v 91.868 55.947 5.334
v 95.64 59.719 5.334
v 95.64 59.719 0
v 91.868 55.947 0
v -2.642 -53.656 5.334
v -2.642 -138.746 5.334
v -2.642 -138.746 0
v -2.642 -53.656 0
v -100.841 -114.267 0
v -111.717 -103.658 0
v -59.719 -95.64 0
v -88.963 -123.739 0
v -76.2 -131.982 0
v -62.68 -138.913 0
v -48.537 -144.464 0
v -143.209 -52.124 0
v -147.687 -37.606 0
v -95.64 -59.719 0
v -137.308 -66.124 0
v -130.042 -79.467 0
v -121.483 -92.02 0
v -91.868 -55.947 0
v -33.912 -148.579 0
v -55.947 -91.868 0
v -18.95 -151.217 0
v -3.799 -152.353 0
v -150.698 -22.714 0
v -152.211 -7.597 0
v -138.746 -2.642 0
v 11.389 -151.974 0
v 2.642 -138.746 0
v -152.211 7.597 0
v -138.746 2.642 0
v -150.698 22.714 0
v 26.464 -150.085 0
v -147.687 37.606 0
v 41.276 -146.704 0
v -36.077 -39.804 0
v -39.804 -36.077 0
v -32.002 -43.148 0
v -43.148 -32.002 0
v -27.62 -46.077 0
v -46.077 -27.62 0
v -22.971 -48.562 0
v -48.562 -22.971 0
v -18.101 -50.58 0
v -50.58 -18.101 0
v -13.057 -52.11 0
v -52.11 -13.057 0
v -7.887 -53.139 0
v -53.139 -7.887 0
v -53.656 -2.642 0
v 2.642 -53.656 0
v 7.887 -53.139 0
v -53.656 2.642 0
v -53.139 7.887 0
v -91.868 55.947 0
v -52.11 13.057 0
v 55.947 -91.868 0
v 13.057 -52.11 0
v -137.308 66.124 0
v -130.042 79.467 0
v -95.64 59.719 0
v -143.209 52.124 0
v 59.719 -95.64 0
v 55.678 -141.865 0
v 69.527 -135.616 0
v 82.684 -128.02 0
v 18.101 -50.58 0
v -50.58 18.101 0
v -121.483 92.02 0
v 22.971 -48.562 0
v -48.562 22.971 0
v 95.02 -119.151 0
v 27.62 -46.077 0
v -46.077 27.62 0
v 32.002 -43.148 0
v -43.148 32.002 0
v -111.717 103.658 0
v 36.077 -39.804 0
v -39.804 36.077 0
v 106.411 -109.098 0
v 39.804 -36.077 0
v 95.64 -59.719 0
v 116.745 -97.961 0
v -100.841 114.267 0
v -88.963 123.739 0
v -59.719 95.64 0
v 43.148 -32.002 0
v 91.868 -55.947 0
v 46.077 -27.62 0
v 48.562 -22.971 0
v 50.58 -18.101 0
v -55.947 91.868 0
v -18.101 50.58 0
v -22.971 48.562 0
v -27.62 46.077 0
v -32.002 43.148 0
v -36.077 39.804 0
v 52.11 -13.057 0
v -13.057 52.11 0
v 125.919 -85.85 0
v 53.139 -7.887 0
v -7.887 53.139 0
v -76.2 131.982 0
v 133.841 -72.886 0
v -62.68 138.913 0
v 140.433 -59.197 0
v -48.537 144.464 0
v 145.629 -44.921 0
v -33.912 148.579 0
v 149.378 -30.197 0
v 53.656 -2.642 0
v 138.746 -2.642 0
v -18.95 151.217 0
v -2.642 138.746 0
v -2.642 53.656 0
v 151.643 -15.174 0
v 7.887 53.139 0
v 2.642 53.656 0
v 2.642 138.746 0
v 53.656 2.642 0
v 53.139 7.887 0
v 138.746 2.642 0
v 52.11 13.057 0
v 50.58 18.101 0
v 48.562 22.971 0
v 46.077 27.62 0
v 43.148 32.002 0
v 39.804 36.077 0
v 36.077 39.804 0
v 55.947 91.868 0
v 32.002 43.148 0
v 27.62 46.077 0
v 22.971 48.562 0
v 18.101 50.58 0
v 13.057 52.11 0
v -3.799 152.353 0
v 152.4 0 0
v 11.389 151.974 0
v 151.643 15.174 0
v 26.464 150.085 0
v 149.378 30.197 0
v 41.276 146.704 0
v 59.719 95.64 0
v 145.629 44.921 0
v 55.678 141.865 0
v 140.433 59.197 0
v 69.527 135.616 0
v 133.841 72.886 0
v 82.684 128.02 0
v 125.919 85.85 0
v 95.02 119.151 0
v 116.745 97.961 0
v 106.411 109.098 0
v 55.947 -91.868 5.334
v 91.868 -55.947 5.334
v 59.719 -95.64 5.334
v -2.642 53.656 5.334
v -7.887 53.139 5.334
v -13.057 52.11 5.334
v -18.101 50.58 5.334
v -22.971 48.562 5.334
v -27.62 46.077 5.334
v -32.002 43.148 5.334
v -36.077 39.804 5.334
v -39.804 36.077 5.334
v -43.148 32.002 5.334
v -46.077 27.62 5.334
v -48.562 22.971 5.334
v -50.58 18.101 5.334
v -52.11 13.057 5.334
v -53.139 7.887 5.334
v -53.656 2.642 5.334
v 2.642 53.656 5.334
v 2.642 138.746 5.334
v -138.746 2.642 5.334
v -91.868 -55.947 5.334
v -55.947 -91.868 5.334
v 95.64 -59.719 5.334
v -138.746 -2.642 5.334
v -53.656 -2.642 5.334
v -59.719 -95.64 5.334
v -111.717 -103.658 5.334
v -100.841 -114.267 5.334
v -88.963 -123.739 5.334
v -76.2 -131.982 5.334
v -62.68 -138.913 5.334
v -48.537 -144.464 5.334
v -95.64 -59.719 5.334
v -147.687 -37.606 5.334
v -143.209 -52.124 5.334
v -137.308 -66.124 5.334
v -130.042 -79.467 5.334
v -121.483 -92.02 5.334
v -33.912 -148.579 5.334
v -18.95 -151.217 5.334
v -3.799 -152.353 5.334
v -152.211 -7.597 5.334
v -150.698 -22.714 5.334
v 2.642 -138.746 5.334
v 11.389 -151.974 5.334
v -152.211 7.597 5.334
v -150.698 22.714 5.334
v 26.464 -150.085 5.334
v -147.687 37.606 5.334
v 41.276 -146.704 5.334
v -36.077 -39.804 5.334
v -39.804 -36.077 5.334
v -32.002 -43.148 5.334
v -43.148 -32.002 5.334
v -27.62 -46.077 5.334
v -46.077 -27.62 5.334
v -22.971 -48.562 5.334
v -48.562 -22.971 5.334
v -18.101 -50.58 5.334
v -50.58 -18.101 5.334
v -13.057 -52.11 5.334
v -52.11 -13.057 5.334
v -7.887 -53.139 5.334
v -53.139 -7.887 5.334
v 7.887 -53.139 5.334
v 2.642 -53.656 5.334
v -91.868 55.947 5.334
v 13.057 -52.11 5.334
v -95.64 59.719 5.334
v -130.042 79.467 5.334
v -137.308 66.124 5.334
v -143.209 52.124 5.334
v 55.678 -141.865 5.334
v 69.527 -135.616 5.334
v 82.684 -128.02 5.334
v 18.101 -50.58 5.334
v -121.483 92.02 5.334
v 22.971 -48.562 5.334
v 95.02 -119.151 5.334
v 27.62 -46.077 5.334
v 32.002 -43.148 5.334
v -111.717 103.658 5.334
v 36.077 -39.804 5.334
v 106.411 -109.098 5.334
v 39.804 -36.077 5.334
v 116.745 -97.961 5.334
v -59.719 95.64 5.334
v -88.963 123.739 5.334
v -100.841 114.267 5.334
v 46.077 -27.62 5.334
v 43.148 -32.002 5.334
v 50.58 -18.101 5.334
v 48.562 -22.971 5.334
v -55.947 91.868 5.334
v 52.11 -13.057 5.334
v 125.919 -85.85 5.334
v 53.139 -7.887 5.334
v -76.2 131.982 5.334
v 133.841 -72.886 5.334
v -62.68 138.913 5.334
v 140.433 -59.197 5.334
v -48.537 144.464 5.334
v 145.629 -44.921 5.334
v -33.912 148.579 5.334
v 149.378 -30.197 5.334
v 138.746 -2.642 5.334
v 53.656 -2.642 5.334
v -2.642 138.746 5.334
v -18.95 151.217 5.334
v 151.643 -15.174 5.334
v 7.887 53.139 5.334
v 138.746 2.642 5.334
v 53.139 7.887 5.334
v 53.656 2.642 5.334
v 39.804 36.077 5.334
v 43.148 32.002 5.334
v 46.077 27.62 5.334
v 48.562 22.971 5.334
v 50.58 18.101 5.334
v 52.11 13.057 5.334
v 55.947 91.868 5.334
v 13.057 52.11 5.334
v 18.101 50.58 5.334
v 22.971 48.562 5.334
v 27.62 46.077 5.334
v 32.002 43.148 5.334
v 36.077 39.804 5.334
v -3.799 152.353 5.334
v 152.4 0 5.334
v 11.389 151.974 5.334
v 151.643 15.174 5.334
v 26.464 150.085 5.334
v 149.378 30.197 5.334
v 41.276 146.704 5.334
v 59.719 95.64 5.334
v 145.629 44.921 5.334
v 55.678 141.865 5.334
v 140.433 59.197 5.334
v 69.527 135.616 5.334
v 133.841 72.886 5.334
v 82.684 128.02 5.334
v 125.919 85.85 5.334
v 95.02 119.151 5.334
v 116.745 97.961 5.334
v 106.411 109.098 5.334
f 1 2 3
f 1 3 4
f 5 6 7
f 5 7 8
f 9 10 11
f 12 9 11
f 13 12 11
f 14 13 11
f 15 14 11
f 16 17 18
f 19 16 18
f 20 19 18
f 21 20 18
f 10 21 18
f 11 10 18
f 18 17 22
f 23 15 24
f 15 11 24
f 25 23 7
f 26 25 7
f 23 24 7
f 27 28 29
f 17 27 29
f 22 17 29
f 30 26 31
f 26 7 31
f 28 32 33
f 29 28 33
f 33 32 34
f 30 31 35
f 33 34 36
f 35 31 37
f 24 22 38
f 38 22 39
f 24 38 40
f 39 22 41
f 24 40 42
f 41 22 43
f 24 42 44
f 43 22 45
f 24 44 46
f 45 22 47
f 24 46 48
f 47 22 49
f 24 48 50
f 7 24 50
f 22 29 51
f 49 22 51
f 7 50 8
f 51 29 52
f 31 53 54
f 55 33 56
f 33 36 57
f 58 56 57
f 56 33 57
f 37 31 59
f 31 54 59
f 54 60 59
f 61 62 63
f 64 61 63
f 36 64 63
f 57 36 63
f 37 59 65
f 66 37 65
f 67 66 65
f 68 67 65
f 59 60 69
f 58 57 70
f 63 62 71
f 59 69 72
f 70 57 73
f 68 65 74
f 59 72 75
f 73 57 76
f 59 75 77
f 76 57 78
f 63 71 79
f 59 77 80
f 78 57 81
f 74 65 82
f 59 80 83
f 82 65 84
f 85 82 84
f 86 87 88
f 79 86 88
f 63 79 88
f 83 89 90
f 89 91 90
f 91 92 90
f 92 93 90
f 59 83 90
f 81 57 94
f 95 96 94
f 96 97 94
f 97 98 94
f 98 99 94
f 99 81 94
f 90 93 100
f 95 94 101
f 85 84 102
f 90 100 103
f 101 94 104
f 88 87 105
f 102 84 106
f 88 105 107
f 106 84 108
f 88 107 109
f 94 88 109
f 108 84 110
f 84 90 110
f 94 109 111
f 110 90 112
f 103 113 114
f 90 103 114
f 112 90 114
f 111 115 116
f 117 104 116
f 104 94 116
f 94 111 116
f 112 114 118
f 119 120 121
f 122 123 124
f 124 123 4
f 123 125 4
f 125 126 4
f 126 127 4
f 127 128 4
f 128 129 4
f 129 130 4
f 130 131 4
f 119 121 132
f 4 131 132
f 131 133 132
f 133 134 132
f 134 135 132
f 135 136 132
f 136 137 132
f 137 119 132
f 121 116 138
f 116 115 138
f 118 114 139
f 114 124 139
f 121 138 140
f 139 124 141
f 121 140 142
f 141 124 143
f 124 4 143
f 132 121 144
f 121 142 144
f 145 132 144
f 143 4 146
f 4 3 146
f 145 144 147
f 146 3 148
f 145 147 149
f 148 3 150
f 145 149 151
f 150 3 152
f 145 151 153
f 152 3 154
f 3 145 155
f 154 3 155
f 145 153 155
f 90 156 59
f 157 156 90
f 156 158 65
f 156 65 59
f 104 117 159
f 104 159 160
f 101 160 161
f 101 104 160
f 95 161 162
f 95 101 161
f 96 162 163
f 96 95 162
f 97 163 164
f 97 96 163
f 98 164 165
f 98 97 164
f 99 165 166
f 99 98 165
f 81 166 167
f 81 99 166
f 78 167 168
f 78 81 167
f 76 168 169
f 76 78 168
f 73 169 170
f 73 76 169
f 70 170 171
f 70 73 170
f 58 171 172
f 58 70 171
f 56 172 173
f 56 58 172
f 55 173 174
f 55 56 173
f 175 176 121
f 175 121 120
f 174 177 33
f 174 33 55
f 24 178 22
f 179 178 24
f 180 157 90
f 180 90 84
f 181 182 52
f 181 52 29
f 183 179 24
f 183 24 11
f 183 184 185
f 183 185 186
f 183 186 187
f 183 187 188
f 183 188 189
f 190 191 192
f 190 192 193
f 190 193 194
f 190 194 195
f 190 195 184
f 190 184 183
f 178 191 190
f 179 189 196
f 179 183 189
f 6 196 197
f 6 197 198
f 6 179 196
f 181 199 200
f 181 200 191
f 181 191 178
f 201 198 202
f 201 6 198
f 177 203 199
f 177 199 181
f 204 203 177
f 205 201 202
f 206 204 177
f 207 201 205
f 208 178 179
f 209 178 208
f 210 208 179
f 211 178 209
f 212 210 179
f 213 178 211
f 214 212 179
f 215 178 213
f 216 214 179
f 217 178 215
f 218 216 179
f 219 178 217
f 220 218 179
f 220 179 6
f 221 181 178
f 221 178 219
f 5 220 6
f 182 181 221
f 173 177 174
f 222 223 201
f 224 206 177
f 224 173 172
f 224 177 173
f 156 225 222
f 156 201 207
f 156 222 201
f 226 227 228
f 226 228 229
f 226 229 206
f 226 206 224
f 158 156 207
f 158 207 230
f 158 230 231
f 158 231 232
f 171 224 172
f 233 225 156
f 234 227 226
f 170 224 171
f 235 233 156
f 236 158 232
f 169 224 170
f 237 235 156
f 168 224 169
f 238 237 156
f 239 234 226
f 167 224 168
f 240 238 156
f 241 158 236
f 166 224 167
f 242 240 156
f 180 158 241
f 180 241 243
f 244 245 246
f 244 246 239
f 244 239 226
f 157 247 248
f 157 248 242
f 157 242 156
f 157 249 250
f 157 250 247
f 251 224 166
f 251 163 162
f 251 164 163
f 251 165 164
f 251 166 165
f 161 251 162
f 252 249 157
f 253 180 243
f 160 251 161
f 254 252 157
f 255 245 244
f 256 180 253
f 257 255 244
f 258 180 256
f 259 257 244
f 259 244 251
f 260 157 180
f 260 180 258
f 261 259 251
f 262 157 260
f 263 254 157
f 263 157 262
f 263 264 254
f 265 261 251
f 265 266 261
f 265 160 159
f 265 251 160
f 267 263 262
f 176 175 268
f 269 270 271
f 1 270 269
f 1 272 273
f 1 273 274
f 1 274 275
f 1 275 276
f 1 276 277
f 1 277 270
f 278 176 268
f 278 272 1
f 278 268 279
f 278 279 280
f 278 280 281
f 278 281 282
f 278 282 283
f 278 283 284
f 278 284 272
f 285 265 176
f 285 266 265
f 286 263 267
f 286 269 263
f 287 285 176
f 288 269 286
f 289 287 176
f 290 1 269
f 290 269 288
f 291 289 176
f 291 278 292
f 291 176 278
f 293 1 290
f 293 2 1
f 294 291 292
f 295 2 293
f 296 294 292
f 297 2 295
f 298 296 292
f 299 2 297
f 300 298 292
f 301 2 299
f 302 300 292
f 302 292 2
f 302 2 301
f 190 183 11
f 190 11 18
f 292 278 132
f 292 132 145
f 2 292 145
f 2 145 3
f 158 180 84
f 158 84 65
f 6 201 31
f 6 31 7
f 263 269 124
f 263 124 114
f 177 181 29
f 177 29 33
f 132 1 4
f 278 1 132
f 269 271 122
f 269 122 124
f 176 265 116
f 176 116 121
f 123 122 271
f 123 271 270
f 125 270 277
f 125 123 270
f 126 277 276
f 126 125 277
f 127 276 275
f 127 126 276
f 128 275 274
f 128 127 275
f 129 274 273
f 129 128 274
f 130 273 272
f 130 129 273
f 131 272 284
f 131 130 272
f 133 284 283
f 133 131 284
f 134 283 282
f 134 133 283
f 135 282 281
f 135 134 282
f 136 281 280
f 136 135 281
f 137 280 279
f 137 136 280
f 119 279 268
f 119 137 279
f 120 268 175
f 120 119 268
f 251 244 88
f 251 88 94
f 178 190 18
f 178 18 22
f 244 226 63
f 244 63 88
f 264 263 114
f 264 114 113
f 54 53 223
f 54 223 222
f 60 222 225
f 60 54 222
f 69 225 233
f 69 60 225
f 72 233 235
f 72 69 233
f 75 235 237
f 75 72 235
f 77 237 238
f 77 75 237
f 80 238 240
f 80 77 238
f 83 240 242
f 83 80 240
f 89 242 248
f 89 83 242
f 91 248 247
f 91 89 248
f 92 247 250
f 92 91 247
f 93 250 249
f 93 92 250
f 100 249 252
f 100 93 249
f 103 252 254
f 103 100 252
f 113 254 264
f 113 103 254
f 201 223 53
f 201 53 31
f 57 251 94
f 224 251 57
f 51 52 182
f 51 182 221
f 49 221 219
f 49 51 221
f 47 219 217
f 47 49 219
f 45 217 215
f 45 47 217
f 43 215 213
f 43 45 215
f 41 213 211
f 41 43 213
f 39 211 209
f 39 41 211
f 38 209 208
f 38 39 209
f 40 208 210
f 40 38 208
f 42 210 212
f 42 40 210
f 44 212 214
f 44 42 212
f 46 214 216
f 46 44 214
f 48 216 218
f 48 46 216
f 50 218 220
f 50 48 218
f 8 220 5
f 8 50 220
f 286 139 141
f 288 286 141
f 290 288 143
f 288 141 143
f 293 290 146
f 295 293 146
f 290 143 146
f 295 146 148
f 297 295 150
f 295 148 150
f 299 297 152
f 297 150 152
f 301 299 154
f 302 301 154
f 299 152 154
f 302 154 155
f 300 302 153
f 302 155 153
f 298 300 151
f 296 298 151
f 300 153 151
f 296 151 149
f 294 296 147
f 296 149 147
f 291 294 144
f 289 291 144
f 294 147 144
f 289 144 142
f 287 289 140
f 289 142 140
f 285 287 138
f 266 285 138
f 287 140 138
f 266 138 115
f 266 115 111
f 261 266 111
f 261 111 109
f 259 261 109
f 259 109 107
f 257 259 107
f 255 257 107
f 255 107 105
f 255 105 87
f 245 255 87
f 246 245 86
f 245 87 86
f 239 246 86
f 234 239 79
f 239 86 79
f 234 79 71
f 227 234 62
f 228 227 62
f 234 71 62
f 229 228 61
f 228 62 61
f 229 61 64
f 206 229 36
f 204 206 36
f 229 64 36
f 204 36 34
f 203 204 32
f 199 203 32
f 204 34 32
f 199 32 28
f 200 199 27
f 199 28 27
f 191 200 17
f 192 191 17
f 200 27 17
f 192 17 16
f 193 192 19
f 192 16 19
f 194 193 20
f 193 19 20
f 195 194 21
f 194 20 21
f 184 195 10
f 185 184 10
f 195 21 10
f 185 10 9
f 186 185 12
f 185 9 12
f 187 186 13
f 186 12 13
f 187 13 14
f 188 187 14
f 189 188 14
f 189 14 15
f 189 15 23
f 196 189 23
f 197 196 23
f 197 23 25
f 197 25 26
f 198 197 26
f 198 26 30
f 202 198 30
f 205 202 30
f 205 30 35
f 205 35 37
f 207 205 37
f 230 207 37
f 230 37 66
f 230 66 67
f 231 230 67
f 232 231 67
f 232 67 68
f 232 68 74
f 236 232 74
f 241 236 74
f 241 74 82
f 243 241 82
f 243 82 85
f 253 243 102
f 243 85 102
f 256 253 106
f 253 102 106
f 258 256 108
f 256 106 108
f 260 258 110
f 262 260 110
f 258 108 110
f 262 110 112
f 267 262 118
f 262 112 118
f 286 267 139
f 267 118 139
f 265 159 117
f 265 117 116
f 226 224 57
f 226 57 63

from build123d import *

# Parameters (mm, degrees)
SKETCH1_R           = 152.4
SKETCH1_R_2         = 53.721
BOSS_EXTRUDE1_DEPTH = 5.334
CUT_EXTRUDE2_REACH  = 217.592
CIRPATTERN1_COUNT   = 4
CUT_EXTRUDE3_REACH  = 217.592
CIRPATTERN2_COUNT   = 4


with BuildPart() as part:
    # Sketch1 → Boss-Extrude1 (new body)
    with BuildSketch(Plane.XY):
        Circle(SKETCH1_R)
        Circle(SKETCH1_R_2, mode=Mode.SUBTRACT)
    extrude(amount=BOSS_EXTRUDE1_DEPTH)

    # Sketch2 → Cut-Extrude2 (cut, up to next)
    with BuildSketch(Plane.XY.offset(5.334), mode=Mode.PRIVATE) as cut_extrude2_sk1:
        with BuildLine():
            Line((-2.6416, 53.656013553), (-2.6416, 138.746013553))
            Line((-2.6416, 138.746013553), (2.6416, 138.746013553))
            Line((2.6416, 138.746013553), (2.6416, 53.656013553))
            ThreePointArc((2.6416, 53.656013553), (0, 53.721), (-2.6416, 53.656013553))
        make_face()
    cut_extrude2_tool1 = extrude(cut_extrude2_sk1.sketch, amount=-CUT_EXTRUDE2_REACH, mode=Mode.PRIVATE) & part.part
    cut_extrude2 = cut_extrude2_tool1.solids().sort_by_distance((0, 96.222676, 5.334))[0]
    add(cut_extrude2, mode=Mode.SUBTRACT)

    # CirPattern1: Cut-Extrude2 ×4 about axis
    cirpattern1_axis = Axis((0, 0, 0), (0, 0, 1))
    for i in range(1, CIRPATTERN1_COUNT):
        add(cut_extrude2.rotate(cirpattern1_axis, i * 360 / CIRPATTERN1_COUNT), mode=Mode.SUBTRACT)

    # Sketch3 → Cut-Extrude3 (cut, up to next)
    with BuildSketch(Plane.XY.offset(5.334), mode=Mode.PRIVATE) as cut_extrude3_sk1:
        Polygon((-95.639727689, 59.718703205), (-59.718703205, 95.639727689), (-55.946995634, 91.868020119), (-91.868020119, 55.946995634), align=None)
    cut_extrude3_tool1 = extrude(cut_extrude3_sk1.sketch, amount=-CUT_EXTRUDE3_REACH, mode=Mode.PRIVATE) & part.part
    cut_extrude3 = cut_extrude3_tool1.solids().sort_by_distance((-75.793362, 75.793362, 5.334))[0]
    add(cut_extrude3, mode=Mode.SUBTRACT)

    # CirPattern2: Cut-Extrude3 ×4 about axis
    cirpattern2_axis = Axis((0, 0, 0), (0, 0, 1))
    for i in range(1, CIRPATTERN2_COUNT):
        add(cut_extrude3.rotate(cirpattern2_axis, i * 360 / CIRPATTERN2_COUNT), mode=Mode.SUBTRACT)


solid = part.part
